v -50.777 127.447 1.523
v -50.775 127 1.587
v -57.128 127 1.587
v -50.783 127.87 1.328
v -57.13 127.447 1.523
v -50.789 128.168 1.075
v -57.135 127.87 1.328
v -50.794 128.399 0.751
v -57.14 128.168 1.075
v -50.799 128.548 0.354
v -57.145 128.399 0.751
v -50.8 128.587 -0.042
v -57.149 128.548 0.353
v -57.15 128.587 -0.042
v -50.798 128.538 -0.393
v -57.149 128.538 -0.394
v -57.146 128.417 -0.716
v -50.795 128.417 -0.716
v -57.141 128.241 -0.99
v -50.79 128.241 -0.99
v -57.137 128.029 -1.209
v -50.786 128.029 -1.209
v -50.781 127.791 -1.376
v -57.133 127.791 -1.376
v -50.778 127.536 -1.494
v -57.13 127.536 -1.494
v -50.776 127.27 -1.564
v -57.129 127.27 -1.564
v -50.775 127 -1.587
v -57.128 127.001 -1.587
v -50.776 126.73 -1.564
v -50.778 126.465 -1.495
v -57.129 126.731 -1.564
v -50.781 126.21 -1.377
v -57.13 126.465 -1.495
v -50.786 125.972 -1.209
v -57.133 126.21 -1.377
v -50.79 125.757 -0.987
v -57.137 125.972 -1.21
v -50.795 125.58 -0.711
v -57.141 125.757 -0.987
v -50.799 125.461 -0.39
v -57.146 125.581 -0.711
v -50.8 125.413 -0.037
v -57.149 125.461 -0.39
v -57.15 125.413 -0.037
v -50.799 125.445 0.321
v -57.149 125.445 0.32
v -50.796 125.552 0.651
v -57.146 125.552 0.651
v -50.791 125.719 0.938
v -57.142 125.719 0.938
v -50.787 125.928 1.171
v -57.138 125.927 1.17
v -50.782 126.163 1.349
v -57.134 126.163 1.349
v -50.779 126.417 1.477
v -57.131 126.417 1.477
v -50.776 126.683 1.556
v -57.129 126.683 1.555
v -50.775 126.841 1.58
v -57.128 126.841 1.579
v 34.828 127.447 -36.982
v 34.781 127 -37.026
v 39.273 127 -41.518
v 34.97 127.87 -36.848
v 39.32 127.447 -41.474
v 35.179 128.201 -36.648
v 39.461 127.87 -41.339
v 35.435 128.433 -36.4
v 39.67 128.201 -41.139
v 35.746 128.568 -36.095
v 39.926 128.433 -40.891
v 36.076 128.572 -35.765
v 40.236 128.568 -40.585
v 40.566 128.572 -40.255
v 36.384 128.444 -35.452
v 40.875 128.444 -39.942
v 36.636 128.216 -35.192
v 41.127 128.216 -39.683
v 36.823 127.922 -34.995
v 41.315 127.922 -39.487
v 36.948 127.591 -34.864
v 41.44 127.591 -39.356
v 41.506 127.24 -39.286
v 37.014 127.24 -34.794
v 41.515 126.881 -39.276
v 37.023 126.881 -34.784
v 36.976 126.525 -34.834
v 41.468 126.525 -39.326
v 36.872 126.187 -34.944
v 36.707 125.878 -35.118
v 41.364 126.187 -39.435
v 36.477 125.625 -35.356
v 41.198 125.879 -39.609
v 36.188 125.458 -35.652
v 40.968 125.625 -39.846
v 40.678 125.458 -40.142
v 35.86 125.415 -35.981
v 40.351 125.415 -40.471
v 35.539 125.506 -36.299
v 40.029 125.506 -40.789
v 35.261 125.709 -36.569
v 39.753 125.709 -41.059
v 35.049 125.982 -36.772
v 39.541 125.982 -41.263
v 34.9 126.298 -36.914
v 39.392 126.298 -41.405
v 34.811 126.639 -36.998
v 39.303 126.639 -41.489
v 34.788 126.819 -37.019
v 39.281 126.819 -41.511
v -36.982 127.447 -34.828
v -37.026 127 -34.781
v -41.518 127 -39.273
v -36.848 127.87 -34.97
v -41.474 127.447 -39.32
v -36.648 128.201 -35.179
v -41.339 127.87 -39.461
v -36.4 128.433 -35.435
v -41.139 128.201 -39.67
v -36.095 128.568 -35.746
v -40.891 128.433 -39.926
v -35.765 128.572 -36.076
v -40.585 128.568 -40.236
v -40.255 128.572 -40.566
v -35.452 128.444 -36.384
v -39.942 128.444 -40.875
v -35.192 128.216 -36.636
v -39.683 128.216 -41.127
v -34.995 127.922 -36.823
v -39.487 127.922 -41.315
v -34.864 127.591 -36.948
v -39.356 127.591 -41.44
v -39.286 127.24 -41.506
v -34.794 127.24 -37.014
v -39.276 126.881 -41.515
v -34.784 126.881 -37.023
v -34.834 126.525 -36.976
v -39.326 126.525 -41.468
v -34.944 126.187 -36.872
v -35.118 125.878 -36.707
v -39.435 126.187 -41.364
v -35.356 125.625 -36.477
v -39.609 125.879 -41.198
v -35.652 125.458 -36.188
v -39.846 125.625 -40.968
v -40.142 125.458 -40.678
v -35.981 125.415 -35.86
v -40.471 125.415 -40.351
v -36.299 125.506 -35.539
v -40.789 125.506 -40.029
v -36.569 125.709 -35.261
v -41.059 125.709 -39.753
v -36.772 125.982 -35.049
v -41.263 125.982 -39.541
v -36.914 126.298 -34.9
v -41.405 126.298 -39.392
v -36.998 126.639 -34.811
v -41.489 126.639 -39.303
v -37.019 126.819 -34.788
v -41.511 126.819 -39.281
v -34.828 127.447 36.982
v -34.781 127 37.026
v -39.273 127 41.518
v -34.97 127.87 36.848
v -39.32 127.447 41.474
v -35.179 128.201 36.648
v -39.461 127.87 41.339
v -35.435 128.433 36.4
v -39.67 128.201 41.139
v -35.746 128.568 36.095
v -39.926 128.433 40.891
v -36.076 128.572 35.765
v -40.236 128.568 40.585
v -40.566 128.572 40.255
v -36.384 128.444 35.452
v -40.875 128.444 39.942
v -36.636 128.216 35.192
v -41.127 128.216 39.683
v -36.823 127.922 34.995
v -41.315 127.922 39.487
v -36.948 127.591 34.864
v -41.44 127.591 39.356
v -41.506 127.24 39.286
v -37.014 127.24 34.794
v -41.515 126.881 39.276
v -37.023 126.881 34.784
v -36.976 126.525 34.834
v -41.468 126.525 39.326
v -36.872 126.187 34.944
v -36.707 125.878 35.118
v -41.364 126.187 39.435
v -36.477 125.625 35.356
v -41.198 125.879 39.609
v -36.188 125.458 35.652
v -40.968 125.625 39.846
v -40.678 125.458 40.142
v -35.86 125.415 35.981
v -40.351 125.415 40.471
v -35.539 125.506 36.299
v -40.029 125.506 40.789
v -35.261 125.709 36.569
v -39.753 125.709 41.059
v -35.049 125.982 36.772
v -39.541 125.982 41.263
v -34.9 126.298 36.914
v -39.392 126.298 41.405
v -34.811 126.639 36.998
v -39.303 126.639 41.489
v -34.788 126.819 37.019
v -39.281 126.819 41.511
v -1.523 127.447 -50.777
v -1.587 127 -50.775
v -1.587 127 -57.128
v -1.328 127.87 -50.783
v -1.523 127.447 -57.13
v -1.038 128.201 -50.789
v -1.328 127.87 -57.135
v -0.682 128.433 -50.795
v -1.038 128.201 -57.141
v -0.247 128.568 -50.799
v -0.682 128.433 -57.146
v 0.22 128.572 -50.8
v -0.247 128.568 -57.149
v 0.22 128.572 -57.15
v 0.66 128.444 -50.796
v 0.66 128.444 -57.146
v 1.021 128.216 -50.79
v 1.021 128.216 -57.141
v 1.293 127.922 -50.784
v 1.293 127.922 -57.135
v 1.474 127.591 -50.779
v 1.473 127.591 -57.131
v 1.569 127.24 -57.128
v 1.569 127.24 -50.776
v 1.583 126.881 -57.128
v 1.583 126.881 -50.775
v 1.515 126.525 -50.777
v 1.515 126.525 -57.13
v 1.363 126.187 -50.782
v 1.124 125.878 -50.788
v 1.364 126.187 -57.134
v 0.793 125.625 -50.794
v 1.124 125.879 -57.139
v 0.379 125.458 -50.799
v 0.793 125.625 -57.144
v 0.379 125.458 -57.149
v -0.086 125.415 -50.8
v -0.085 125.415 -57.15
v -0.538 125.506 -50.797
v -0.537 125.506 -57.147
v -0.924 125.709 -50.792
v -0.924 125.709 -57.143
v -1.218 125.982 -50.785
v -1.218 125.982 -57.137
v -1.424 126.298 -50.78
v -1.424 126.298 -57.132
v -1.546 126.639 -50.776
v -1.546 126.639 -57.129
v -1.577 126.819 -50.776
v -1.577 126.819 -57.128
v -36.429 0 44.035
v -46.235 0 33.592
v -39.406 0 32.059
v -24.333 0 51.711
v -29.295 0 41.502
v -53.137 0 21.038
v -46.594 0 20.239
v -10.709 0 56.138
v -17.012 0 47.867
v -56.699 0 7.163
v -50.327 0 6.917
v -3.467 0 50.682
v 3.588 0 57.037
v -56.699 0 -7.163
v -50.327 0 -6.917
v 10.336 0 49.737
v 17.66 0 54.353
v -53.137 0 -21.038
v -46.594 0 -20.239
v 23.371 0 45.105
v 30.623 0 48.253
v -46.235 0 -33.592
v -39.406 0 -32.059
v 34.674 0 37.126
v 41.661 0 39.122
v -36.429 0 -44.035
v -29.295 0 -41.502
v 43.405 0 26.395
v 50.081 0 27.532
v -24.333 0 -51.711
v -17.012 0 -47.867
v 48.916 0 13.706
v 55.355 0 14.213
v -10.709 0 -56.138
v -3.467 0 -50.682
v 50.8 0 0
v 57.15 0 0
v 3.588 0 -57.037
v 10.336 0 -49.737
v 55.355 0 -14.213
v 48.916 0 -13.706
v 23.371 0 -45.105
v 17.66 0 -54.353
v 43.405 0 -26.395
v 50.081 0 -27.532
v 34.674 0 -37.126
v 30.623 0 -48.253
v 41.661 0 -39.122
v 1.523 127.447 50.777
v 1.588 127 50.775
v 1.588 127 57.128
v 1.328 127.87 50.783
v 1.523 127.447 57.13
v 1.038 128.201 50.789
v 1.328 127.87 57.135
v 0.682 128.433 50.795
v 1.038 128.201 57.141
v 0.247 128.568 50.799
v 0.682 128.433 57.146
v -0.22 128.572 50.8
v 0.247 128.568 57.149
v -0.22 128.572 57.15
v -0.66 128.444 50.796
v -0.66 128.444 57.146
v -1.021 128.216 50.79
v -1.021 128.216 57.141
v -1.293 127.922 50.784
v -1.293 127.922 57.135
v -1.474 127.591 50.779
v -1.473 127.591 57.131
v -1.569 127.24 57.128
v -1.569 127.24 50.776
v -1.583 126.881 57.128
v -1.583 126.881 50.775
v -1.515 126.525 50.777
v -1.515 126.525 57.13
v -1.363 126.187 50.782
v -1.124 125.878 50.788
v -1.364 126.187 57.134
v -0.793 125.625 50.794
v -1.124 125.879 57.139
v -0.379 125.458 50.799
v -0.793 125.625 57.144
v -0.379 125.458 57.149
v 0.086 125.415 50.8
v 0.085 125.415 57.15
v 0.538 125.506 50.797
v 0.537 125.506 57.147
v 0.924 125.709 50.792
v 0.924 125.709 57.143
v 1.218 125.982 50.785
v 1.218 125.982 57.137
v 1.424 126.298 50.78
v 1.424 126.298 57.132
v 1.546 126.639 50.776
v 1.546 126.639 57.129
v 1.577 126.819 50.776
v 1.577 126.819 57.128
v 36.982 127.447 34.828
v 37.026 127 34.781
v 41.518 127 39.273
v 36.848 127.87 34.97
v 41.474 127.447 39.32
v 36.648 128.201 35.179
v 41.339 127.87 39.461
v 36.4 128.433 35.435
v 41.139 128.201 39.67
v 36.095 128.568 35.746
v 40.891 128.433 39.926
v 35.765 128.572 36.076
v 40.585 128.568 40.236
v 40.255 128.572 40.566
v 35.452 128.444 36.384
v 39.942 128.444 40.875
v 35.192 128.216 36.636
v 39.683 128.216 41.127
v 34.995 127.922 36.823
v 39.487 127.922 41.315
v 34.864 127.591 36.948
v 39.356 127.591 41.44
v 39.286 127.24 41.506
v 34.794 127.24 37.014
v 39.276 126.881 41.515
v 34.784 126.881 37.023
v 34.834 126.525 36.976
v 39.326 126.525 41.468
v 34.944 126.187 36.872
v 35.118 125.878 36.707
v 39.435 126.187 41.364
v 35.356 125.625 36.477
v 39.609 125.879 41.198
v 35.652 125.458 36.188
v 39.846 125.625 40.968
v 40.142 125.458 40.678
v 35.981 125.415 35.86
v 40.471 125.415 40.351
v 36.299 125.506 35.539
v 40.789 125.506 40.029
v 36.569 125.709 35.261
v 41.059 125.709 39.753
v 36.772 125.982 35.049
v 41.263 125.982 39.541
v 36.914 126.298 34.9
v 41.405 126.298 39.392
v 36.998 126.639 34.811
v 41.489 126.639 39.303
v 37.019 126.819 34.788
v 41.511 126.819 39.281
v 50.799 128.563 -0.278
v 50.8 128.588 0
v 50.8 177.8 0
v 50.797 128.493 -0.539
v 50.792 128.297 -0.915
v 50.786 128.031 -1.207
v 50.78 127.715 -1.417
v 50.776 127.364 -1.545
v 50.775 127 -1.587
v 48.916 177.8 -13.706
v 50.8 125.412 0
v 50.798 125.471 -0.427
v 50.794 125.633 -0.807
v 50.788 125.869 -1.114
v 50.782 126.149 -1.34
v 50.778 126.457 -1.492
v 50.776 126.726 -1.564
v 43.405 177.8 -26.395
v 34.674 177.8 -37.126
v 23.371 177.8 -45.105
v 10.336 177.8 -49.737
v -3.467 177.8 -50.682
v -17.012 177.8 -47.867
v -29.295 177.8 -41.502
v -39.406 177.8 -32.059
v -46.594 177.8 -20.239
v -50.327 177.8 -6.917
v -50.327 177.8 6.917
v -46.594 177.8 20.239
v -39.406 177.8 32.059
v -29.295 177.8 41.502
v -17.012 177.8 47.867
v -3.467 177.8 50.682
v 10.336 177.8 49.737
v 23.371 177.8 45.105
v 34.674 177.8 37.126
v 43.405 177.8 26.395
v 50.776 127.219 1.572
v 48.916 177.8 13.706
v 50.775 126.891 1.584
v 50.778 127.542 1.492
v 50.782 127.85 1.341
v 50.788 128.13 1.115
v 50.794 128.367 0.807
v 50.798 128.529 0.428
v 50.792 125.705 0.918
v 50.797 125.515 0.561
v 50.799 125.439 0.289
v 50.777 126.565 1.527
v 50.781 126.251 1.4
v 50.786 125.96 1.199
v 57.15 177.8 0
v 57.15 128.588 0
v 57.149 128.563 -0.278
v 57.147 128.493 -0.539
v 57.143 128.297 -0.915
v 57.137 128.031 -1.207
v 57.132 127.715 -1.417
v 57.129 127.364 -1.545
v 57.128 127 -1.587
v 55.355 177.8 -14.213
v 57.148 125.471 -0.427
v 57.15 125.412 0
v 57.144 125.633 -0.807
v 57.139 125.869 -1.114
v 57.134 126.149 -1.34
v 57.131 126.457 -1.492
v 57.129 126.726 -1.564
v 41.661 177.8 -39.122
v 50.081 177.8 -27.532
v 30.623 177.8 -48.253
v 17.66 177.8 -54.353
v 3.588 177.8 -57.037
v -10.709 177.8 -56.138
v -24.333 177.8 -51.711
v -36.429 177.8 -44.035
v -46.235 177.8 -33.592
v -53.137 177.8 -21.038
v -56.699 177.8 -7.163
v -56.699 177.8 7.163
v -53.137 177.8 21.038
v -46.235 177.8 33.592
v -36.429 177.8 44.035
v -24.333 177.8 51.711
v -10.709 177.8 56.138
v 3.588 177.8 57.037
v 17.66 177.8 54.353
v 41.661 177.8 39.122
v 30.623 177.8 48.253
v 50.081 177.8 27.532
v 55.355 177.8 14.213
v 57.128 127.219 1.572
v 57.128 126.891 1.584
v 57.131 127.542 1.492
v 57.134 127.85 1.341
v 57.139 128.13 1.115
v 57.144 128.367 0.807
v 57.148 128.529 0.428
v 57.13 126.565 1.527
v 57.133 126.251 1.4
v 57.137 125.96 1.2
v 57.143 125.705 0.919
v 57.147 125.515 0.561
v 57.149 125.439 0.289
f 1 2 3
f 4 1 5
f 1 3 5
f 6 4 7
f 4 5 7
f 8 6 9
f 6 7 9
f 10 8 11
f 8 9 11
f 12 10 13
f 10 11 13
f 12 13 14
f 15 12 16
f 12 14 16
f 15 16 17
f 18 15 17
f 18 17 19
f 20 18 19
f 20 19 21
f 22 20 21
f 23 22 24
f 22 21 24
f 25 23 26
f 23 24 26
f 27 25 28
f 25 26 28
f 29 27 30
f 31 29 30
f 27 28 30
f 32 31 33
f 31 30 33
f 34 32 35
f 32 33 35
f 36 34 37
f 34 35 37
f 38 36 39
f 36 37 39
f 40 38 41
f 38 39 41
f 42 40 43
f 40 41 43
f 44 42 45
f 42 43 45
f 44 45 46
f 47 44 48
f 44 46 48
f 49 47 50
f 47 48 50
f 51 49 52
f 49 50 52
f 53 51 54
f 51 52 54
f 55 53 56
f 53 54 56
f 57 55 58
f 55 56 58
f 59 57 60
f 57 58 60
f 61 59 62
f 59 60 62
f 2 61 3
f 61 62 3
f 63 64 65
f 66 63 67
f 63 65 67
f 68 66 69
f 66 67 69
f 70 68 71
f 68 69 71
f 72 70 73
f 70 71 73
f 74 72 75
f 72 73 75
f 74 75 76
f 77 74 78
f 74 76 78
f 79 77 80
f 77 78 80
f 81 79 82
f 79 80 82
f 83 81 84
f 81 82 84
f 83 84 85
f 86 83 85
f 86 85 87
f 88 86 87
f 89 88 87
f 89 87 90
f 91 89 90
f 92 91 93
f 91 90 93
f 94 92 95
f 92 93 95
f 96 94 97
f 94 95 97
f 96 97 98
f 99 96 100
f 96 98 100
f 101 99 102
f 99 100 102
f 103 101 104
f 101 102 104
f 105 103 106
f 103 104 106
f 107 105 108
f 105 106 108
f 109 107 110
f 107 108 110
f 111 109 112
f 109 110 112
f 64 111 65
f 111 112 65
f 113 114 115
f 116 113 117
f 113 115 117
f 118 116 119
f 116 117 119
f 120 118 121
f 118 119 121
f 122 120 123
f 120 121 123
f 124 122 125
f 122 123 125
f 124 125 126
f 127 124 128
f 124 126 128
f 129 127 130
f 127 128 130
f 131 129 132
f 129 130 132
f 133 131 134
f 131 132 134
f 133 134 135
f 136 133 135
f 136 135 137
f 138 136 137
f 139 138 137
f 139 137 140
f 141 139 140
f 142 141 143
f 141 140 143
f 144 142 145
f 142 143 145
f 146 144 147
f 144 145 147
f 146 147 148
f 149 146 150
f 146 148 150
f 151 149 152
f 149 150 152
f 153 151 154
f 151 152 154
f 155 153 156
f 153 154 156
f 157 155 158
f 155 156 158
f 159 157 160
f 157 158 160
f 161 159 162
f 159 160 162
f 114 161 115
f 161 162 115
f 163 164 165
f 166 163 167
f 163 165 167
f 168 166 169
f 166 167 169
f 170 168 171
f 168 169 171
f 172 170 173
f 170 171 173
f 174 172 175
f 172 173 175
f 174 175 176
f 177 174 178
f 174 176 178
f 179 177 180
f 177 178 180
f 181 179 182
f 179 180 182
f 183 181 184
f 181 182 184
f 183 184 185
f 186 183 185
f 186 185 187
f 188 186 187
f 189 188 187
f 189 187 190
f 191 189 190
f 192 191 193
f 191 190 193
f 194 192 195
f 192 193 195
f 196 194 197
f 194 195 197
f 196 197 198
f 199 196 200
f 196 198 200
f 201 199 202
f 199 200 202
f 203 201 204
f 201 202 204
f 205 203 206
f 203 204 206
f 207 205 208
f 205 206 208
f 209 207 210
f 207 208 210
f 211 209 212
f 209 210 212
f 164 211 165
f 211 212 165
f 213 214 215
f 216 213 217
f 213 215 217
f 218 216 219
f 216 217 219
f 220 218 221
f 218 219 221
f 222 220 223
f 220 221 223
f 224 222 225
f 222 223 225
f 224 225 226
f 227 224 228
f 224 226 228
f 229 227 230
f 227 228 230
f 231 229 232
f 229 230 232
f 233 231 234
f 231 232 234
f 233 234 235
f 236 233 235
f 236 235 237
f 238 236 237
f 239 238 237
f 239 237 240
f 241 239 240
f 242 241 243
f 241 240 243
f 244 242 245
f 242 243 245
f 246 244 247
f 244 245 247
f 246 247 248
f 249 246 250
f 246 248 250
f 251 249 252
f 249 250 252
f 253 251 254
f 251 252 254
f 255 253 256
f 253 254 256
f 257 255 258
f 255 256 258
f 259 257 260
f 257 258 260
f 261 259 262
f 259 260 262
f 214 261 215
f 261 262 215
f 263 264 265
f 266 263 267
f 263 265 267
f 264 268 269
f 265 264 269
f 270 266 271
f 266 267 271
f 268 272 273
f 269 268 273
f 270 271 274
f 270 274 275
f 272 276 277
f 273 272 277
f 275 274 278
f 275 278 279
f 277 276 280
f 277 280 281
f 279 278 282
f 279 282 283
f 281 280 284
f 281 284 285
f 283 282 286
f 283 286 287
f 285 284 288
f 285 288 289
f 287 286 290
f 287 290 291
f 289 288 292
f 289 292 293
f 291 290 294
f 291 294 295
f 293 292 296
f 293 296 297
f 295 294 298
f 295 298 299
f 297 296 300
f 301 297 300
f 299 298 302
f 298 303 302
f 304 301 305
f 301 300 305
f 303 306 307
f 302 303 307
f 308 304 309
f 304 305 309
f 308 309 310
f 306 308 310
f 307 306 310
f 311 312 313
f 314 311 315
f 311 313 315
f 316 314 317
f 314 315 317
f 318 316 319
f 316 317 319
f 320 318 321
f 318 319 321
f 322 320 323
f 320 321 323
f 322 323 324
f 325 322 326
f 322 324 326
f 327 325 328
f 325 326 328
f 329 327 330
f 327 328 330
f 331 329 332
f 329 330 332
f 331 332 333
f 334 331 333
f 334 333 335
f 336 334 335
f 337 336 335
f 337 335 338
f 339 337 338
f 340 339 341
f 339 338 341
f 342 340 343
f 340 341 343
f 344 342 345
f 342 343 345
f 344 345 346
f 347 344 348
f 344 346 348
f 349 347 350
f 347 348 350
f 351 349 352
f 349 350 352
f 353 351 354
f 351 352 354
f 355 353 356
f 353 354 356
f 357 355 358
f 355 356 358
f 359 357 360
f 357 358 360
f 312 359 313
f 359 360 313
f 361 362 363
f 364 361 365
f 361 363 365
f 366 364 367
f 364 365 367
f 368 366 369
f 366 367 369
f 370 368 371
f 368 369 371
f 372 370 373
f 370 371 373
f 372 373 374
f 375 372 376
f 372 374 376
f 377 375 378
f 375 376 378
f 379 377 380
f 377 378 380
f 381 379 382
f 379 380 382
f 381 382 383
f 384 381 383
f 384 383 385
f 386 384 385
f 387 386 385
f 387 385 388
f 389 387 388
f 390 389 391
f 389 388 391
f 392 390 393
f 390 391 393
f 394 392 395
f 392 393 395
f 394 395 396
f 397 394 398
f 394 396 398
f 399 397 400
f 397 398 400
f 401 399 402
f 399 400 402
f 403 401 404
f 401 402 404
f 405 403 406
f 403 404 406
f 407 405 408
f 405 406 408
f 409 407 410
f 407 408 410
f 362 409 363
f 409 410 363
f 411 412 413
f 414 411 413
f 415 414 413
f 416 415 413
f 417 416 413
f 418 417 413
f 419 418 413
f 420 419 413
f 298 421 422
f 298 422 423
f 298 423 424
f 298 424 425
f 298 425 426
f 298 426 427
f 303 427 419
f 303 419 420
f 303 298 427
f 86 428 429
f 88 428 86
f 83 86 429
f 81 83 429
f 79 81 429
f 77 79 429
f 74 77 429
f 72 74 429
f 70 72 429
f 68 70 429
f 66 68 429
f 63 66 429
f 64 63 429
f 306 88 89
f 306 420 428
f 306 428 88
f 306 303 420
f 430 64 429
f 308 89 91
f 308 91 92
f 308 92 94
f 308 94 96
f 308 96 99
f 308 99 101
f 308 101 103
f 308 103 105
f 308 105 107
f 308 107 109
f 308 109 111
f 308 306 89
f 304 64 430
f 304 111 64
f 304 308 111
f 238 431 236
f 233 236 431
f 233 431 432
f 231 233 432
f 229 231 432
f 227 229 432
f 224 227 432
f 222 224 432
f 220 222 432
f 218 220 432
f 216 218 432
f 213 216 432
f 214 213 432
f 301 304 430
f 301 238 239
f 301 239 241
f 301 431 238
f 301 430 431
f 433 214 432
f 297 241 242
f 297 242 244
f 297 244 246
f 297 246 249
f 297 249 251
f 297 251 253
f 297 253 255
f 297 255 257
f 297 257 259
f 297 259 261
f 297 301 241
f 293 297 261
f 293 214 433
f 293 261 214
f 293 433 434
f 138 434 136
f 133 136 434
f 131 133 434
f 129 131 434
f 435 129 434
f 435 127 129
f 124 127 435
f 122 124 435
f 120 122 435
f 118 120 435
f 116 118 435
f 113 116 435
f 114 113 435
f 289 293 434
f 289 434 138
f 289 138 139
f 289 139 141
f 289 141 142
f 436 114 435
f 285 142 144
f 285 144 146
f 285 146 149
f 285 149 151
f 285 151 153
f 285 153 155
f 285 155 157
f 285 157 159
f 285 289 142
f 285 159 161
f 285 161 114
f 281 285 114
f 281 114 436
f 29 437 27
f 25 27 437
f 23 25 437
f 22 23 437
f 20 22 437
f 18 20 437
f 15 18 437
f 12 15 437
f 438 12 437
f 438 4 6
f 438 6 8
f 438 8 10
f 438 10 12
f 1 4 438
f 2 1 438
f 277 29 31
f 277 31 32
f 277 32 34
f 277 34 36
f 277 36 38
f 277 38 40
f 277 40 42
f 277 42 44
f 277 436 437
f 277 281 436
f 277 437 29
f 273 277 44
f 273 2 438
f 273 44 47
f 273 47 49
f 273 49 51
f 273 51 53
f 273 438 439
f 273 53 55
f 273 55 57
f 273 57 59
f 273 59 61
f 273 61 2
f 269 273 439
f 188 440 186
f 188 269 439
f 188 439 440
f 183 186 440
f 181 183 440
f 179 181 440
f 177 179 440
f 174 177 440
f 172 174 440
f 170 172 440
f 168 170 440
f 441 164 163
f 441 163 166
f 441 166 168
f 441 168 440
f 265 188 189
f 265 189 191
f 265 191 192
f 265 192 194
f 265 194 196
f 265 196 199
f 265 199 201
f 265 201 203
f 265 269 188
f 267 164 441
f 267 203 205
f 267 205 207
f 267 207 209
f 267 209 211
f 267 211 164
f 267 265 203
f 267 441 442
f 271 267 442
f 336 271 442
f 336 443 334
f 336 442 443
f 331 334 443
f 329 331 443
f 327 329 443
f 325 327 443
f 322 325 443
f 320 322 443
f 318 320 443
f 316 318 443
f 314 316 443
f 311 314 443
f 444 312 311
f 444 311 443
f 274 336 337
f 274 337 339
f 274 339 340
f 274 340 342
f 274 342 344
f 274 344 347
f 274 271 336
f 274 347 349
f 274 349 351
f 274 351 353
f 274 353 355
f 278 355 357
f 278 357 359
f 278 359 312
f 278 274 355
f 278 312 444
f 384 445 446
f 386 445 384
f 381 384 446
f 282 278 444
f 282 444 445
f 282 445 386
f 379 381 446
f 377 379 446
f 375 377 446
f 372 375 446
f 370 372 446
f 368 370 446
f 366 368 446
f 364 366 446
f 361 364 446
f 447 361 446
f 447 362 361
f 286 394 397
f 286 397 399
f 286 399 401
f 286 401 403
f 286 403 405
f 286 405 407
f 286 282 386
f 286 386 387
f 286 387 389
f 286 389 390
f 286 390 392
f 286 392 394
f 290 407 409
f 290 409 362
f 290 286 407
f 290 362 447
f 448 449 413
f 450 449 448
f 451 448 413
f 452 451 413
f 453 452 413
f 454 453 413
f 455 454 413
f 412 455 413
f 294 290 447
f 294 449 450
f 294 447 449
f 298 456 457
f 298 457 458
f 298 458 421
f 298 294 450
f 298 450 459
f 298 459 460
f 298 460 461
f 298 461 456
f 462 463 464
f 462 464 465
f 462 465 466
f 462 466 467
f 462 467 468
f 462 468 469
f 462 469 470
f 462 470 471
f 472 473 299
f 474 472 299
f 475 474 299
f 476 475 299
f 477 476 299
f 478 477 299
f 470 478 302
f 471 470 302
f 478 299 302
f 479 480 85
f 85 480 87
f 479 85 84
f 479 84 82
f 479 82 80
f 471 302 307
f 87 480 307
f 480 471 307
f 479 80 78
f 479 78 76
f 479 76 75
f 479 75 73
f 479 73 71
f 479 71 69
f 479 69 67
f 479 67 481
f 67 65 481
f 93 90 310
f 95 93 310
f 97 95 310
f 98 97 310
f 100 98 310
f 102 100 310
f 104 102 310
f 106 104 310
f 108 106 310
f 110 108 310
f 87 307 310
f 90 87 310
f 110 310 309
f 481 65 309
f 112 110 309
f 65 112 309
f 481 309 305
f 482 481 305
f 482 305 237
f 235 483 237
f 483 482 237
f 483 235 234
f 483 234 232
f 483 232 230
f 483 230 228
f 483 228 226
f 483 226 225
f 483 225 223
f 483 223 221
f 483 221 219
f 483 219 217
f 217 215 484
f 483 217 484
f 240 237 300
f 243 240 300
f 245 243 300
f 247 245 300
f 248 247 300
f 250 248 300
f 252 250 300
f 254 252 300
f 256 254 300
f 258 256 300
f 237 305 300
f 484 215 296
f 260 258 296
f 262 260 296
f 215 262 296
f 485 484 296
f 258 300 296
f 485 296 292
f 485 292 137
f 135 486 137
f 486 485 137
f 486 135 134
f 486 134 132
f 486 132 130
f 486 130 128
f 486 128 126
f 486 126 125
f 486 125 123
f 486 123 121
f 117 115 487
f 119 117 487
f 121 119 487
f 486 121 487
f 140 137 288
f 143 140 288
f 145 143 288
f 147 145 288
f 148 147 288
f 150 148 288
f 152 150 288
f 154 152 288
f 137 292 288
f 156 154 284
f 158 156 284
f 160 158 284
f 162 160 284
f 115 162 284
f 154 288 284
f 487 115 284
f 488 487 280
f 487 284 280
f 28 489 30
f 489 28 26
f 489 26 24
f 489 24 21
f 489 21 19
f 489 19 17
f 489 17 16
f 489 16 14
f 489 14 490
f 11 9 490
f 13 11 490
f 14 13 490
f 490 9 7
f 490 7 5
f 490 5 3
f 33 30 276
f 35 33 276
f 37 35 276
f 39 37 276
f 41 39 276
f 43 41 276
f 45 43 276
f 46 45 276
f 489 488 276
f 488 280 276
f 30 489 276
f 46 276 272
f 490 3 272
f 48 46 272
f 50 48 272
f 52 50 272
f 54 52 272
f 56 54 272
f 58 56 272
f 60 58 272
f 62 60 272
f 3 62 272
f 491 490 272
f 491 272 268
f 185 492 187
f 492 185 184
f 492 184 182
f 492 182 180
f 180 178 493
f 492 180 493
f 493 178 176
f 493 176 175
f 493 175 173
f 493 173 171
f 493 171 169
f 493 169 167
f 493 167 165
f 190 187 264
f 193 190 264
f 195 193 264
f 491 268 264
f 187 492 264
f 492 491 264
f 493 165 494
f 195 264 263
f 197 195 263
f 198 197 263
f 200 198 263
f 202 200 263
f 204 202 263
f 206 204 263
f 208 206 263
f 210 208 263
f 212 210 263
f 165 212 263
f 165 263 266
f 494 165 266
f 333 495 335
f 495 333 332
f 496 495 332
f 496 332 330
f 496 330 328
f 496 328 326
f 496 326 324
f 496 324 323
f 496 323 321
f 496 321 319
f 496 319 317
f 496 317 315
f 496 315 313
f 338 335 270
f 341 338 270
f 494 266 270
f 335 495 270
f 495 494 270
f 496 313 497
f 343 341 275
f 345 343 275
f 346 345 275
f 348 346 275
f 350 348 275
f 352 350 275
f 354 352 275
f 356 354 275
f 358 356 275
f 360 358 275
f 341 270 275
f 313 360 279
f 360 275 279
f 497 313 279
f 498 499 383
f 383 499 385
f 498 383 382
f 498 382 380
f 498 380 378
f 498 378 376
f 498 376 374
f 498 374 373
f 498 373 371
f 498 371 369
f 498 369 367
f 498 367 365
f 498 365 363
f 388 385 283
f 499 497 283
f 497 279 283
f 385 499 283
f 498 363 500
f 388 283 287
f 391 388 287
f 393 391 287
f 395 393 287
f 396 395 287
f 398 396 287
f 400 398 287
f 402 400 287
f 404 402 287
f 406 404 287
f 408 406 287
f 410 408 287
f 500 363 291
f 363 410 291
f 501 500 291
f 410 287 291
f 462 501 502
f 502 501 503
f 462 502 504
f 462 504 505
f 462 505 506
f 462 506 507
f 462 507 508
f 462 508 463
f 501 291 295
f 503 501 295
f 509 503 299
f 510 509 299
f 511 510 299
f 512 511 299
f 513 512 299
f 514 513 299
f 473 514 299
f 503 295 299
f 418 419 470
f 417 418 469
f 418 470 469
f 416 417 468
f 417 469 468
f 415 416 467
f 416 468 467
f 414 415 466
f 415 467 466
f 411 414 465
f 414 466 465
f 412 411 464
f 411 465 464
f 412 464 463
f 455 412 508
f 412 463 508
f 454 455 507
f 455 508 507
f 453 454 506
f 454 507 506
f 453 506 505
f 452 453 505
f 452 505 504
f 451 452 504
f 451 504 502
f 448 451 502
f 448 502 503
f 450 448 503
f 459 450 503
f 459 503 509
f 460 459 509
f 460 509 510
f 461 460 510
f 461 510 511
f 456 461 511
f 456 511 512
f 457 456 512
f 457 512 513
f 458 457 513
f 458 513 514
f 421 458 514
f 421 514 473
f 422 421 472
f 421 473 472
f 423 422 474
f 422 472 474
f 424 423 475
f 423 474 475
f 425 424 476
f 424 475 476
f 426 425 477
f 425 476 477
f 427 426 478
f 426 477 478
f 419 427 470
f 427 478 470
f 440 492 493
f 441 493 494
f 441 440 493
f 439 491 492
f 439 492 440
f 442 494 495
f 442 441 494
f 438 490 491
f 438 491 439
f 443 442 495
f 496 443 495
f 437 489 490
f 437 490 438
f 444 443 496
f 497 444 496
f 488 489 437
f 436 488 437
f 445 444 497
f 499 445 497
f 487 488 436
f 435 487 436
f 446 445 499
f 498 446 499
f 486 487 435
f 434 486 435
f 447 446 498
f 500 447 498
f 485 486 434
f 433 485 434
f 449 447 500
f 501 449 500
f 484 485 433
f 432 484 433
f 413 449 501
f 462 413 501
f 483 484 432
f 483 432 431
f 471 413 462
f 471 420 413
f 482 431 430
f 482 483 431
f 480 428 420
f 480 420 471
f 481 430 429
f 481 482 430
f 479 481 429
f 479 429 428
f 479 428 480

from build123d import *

# Parameters (mm, degrees)
SKETCH1_R           = 57.15
SKETCH1_R_2         = 50.8
BOSS_EXTRUDE1_DEPTH = 177.8
SKETCH3_R           = 1.5875
CUT_EXTRUDE1_DEPTH  = 6.35
CIRPATTERN1_COUNT   = 8


with BuildPart() as part:
    # Sketch1 → Boss-Extrude1 (new body)
    with BuildSketch(Plane(origin=(0, 0, 0), x_dir=(1, 0, 0), z_dir=(0, 1, 0))):
        Circle(SKETCH1_R)
        Circle(SKETCH1_R_2, mode=Mode.SUBTRACT)
    extrude(amount=BOSS_EXTRUDE1_DEPTH)

    # Sketch3 → Cut-Extrude1 (cut, symmetric)
    with BuildSketch(Plane.XY.offset(53.975)):
        with Locations((0, 127)):
            Circle(SKETCH3_R)
    cut_extrude1 = extrude(amount=CUT_EXTRUDE1_DEPTH, both=True, mode=Mode.SUBTRACT)

    # CirPattern1: Cut-Extrude1 ×8 about axis
    cirpattern1_axis = Axis((0, 177.8, 0), (0, 1, 0))
    for i in range(1, CIRPATTERN1_COUNT):
        add(cut_extrude1.rotate(cirpattern1_axis, i * 360 / CIRPATTERN1_COUNT), mode=Mode.SUBTRACT)


solid = part.part
